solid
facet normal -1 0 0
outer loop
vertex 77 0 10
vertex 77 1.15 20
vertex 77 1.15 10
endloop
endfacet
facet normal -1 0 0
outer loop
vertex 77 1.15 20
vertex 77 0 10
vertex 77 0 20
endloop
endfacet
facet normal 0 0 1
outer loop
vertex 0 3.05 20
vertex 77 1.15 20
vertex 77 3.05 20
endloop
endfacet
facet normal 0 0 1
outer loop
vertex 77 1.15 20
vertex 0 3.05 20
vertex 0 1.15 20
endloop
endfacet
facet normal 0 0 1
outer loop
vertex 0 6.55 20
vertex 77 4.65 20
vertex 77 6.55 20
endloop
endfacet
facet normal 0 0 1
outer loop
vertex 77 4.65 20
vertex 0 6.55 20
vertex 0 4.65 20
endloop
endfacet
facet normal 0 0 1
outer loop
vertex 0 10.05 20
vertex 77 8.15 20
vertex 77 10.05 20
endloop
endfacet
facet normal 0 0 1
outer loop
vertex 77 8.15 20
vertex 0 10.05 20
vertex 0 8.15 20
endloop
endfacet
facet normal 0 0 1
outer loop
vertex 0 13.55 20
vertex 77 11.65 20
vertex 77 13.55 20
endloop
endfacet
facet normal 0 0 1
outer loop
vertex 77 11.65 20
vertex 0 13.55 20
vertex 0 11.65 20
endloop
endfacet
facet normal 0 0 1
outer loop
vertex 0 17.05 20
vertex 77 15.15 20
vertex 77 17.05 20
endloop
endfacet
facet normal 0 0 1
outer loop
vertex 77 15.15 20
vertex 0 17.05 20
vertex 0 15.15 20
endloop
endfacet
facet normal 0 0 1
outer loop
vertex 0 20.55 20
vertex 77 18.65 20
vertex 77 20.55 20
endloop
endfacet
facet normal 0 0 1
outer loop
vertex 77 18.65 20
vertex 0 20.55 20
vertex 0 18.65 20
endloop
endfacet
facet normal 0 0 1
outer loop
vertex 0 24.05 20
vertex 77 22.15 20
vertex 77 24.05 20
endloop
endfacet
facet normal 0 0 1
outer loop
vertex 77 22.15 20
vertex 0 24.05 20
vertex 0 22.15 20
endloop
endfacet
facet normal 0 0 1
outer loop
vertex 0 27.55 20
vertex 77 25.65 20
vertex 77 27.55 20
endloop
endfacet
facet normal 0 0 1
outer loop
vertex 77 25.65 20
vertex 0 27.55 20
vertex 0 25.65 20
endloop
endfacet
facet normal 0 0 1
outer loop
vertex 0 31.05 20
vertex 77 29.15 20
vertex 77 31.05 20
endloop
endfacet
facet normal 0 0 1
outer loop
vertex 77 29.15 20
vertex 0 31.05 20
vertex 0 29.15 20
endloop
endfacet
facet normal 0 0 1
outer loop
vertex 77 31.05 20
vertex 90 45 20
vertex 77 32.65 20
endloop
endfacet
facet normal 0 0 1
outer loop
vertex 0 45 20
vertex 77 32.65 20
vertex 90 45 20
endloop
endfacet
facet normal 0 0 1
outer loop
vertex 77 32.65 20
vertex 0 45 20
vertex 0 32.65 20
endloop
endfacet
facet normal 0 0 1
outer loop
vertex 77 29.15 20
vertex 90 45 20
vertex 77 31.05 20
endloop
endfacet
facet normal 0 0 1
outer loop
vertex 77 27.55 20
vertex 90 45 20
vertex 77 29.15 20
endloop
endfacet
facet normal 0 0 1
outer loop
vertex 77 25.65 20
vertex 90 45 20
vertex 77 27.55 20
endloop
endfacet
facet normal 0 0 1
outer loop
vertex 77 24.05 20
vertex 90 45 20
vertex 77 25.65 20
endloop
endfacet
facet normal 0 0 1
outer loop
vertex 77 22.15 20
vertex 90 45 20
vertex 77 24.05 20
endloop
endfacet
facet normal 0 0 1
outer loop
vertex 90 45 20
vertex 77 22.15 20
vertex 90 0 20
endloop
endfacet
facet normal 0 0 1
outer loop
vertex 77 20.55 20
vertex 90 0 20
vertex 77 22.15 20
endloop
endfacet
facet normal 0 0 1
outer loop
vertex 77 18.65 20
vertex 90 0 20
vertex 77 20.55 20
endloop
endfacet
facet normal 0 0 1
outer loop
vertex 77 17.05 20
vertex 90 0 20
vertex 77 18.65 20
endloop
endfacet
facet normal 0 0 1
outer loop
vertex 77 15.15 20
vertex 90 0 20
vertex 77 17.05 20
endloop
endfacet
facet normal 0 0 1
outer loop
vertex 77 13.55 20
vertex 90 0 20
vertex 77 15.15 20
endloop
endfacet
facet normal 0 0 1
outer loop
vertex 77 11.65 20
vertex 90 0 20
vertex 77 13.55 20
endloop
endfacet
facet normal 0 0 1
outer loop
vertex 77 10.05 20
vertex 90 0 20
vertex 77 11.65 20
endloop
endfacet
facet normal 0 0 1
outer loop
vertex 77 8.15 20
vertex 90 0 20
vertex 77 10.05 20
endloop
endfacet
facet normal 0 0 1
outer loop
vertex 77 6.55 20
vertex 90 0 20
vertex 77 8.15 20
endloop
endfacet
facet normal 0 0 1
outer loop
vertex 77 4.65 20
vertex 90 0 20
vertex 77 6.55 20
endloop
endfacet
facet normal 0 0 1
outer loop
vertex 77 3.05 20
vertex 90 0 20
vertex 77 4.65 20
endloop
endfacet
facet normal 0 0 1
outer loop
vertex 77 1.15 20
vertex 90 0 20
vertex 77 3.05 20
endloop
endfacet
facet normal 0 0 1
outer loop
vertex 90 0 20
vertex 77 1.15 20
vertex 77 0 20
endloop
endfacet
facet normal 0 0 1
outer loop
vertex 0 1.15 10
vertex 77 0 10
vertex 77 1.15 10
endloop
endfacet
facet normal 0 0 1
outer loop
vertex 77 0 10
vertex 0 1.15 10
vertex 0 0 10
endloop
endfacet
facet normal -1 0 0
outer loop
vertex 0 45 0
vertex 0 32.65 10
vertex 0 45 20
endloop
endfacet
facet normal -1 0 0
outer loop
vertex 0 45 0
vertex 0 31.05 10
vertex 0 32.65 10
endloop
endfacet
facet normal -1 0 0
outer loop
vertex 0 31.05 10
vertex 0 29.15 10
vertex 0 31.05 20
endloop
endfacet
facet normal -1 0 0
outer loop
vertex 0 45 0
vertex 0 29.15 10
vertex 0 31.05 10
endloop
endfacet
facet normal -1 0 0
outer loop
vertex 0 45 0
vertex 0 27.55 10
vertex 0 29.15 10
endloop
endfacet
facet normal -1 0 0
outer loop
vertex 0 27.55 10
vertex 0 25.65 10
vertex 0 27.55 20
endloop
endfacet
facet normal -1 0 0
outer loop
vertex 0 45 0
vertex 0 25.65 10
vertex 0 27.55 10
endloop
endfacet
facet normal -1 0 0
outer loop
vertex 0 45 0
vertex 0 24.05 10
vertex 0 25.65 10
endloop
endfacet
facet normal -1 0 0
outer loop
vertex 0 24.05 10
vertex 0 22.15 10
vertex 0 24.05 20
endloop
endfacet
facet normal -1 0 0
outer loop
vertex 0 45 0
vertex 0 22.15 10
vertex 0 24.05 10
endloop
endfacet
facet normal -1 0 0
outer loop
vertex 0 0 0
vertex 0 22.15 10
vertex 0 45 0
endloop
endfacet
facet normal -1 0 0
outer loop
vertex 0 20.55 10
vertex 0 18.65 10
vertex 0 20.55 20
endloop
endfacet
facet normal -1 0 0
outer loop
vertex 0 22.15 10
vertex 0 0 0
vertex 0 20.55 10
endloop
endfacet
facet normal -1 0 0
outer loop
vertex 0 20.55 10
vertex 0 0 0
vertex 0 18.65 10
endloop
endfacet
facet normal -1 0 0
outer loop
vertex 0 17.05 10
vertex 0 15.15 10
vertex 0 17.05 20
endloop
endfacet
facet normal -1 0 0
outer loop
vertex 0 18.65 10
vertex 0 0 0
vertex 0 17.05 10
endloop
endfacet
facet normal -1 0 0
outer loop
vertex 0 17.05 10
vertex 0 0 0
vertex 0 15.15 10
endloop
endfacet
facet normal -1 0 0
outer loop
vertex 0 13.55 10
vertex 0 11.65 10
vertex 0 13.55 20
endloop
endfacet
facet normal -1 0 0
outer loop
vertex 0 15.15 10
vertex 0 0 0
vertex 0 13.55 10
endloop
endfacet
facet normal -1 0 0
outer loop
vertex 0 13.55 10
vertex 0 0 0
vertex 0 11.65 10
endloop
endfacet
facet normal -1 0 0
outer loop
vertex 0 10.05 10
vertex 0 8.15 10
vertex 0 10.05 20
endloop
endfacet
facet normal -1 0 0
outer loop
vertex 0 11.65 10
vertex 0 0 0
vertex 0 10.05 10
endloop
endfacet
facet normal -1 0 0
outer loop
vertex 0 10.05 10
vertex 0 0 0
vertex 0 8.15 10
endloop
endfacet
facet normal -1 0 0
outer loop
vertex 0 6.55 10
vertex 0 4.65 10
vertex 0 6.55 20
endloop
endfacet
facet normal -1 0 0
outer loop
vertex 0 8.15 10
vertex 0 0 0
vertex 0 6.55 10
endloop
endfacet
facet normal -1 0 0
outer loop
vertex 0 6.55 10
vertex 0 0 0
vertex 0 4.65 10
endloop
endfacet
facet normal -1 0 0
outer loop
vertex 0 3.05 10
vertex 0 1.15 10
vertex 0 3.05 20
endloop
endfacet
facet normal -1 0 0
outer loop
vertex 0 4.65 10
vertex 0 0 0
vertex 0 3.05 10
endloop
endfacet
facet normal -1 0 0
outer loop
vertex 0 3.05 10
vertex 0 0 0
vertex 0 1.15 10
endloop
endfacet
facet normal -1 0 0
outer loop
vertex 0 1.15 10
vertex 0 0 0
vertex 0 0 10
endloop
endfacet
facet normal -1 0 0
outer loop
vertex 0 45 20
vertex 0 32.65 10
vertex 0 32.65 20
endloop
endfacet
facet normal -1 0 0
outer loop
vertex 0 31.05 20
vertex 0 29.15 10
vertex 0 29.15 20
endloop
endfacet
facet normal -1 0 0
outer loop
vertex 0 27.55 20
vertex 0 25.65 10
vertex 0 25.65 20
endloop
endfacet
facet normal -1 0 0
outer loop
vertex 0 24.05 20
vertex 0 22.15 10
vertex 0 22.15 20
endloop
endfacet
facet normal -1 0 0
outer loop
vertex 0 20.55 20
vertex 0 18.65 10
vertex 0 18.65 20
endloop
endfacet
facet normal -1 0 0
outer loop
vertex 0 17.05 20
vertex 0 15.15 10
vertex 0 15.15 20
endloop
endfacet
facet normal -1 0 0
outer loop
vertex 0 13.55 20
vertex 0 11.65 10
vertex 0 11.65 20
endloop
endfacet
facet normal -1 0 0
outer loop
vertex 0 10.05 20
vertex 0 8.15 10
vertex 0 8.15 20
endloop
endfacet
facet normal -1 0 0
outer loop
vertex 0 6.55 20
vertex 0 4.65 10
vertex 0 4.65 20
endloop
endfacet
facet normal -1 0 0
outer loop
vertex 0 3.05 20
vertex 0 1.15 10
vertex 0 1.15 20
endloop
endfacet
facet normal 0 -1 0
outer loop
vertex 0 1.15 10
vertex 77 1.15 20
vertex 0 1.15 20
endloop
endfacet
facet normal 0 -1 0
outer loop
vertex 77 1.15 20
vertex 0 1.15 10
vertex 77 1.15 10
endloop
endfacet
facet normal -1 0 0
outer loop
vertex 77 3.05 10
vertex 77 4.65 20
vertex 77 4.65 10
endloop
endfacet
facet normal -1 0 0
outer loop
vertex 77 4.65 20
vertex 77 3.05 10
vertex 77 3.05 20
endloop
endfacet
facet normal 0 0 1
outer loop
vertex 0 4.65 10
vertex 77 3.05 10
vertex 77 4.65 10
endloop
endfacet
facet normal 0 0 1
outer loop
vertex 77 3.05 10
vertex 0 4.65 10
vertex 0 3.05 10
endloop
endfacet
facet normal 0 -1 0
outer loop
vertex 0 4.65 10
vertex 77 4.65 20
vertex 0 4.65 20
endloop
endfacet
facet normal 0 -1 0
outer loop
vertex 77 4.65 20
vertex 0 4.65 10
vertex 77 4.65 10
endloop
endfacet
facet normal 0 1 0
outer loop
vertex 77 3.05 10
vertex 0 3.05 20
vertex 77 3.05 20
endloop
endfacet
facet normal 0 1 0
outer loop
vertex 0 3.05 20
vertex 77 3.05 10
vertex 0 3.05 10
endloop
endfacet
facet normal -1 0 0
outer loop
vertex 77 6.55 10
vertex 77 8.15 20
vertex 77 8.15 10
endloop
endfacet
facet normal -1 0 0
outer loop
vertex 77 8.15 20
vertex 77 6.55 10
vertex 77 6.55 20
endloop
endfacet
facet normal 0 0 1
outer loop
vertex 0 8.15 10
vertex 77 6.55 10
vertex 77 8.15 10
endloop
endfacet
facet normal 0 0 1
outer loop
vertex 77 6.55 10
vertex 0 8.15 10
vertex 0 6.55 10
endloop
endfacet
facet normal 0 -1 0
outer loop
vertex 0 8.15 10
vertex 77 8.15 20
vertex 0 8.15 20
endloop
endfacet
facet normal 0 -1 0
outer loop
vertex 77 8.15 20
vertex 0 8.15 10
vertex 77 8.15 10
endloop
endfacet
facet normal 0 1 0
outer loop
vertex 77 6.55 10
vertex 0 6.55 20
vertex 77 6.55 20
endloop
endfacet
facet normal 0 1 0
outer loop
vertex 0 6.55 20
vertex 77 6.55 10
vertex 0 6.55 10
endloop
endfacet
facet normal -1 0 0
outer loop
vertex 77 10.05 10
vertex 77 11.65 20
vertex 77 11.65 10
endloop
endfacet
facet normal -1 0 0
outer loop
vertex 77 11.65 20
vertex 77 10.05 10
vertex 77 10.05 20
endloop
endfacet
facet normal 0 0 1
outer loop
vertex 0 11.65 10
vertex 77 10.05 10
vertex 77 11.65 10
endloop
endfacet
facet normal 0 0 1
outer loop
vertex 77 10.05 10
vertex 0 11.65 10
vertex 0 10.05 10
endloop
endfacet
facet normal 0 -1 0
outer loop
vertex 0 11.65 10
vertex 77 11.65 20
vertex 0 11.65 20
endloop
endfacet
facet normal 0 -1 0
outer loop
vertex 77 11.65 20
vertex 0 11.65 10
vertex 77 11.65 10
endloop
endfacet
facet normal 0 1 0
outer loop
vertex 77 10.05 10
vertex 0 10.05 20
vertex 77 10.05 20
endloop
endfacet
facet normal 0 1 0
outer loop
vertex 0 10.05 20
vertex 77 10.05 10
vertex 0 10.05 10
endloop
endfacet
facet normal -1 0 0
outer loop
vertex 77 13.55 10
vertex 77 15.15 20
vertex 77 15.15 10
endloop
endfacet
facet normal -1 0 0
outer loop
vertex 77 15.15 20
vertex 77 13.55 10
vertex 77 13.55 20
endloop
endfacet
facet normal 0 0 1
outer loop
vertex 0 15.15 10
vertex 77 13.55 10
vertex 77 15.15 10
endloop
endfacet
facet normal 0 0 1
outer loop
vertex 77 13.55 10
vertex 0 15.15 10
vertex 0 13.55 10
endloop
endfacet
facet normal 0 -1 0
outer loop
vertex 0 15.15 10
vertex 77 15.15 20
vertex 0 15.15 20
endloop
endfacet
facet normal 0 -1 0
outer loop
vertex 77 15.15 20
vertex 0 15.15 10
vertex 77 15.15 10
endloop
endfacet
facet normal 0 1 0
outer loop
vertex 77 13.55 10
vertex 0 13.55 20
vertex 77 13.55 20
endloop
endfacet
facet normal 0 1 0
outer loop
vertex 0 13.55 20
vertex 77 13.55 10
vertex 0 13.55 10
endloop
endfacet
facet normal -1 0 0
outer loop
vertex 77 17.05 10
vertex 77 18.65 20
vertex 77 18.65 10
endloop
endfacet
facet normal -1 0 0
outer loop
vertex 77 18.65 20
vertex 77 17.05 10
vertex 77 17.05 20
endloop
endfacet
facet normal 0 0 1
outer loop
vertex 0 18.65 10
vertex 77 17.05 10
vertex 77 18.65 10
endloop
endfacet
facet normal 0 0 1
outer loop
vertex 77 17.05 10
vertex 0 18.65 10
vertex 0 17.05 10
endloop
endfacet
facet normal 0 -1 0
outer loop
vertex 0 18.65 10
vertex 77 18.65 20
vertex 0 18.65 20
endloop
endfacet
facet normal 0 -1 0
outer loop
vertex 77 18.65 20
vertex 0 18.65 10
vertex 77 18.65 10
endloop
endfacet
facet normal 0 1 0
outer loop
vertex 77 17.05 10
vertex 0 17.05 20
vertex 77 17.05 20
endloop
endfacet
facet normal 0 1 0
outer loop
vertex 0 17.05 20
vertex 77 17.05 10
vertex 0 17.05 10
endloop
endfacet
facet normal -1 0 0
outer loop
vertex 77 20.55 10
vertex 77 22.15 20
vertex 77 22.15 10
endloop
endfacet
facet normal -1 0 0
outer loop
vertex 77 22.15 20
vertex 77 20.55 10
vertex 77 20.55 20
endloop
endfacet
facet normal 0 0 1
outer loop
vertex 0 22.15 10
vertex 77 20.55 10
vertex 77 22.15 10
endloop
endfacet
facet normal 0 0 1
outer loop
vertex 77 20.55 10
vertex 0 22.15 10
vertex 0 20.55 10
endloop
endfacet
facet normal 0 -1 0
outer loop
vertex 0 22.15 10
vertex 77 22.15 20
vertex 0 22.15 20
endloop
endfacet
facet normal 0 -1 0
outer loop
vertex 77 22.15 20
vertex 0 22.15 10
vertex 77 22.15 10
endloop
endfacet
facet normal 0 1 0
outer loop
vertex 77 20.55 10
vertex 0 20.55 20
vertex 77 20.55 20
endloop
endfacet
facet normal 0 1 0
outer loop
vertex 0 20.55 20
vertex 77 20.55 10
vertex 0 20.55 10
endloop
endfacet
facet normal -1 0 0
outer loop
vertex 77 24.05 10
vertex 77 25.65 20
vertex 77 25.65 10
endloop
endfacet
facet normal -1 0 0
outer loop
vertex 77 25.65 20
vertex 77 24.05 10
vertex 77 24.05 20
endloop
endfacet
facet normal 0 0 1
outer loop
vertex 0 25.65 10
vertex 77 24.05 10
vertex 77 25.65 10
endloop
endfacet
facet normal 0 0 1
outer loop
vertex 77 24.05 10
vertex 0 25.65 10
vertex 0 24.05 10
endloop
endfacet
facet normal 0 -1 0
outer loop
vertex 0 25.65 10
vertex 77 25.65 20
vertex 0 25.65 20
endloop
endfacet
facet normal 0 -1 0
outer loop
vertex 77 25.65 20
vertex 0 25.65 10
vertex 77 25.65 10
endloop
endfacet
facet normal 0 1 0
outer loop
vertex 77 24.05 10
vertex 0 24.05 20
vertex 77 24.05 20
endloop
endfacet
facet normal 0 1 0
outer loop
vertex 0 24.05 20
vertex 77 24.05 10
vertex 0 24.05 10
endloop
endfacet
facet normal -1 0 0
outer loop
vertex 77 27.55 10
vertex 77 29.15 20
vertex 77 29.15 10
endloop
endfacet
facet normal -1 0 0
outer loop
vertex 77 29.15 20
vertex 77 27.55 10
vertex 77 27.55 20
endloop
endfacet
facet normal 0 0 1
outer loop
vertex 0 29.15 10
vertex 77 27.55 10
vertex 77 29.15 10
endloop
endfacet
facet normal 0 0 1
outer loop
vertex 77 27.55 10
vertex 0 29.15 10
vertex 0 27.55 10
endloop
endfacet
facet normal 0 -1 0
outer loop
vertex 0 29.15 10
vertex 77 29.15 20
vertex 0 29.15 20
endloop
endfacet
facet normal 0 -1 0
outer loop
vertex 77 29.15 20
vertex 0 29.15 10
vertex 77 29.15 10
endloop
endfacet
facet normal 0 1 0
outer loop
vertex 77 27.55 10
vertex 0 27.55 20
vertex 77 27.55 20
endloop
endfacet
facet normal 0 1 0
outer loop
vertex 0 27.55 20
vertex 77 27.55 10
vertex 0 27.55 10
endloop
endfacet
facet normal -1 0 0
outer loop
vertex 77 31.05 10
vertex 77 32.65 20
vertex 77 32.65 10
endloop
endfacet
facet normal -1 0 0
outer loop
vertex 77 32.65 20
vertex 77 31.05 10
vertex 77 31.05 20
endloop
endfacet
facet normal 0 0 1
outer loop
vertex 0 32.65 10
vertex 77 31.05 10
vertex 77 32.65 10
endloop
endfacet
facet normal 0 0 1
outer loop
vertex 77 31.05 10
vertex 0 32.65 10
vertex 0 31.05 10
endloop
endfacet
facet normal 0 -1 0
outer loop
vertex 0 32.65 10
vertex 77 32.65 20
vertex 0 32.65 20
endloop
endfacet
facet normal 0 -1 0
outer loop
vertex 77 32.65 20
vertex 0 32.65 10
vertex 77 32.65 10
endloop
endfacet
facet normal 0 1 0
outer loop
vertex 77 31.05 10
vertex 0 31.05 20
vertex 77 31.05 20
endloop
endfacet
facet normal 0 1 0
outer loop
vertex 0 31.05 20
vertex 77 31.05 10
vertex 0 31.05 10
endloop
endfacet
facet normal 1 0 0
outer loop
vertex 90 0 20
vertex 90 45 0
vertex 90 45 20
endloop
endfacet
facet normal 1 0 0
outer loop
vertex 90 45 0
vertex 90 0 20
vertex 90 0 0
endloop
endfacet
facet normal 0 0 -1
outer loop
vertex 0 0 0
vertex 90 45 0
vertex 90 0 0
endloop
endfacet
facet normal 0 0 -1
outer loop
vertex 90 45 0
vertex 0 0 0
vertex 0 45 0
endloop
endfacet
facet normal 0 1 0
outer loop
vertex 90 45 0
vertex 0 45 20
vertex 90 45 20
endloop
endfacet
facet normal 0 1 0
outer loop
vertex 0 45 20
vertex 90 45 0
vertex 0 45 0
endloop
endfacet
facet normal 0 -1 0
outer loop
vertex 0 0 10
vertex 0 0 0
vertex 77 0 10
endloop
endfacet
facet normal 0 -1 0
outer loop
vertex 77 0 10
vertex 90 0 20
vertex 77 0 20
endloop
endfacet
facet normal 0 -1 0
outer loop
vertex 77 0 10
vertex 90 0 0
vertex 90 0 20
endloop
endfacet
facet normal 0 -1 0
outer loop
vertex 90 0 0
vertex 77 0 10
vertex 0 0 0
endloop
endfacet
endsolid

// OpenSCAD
// Drying Rack for 10 Microscope Slides
// Base: 90 x 45 x 20 mm
// Slots: 10 parallel slots along X, 77mm long, 1.6mm wide, 10mm deep
// Spacing: 3.5mm centre-to-centre in Y, centred on block

$fn = 128;

// Base Dimensions
base_length = 90;
base_width = 45;
base_height = 20;

// Slide Dimensions (for reference)
slide_length = 75;
slide_width = 25;
slide_thickness = 1;

// Slot Dimensions
slot_length = 77;
slot_width = 1.6;
slot_depth = 10;

// Layout Dimensions
slot_spacing = 3.5; // Centre-to-centre in Y
num_slots = 10;

// Calculate Y position of the first slot centre
// Total width of slots = num_slots * slot_width
// Total width of gaps = (num_slots - 1) * slot_spacing
// Remaining space to distribute on both sides = (base_width - total_slots - total_gaps) / 2
total_slot_width = num_slots * slot_width;
total_gap_width = (num_slots - 1) * slot_spacing;
offset_from_edge = (base_width - total_slot_width - total_gap_width) / 2;
first_slot_y = offset_from_edge + slot_width / 2;

// Build the solid block
difference() {
    // Main Block
    cube([base_length, base_width, base_height], center = false);
    
    // Cut Slots
    // Slots run along X, so we cut from the top face downwards
    // We use a loop to generate 10 slots
    for (i = [0 : num_slots - 1]) {
        // Calculate Y position for current slot
        current_y = first_slot_y + i * slot_spacing;
        
        // Define the slot geometry
        // The slot is a rectangular prism cut out from the top
        // We extend slightly past the edges to ensure clean cuts
        slot_x = slot_length / 2;
        slot_y = slot_width / 2;
        slot_z = slot_depth;
        
        translate([0, current_y, base_height - slot_z]) {
            cube([slot_length, slot_width, slot_depth], center = false);
        }
    }
}
